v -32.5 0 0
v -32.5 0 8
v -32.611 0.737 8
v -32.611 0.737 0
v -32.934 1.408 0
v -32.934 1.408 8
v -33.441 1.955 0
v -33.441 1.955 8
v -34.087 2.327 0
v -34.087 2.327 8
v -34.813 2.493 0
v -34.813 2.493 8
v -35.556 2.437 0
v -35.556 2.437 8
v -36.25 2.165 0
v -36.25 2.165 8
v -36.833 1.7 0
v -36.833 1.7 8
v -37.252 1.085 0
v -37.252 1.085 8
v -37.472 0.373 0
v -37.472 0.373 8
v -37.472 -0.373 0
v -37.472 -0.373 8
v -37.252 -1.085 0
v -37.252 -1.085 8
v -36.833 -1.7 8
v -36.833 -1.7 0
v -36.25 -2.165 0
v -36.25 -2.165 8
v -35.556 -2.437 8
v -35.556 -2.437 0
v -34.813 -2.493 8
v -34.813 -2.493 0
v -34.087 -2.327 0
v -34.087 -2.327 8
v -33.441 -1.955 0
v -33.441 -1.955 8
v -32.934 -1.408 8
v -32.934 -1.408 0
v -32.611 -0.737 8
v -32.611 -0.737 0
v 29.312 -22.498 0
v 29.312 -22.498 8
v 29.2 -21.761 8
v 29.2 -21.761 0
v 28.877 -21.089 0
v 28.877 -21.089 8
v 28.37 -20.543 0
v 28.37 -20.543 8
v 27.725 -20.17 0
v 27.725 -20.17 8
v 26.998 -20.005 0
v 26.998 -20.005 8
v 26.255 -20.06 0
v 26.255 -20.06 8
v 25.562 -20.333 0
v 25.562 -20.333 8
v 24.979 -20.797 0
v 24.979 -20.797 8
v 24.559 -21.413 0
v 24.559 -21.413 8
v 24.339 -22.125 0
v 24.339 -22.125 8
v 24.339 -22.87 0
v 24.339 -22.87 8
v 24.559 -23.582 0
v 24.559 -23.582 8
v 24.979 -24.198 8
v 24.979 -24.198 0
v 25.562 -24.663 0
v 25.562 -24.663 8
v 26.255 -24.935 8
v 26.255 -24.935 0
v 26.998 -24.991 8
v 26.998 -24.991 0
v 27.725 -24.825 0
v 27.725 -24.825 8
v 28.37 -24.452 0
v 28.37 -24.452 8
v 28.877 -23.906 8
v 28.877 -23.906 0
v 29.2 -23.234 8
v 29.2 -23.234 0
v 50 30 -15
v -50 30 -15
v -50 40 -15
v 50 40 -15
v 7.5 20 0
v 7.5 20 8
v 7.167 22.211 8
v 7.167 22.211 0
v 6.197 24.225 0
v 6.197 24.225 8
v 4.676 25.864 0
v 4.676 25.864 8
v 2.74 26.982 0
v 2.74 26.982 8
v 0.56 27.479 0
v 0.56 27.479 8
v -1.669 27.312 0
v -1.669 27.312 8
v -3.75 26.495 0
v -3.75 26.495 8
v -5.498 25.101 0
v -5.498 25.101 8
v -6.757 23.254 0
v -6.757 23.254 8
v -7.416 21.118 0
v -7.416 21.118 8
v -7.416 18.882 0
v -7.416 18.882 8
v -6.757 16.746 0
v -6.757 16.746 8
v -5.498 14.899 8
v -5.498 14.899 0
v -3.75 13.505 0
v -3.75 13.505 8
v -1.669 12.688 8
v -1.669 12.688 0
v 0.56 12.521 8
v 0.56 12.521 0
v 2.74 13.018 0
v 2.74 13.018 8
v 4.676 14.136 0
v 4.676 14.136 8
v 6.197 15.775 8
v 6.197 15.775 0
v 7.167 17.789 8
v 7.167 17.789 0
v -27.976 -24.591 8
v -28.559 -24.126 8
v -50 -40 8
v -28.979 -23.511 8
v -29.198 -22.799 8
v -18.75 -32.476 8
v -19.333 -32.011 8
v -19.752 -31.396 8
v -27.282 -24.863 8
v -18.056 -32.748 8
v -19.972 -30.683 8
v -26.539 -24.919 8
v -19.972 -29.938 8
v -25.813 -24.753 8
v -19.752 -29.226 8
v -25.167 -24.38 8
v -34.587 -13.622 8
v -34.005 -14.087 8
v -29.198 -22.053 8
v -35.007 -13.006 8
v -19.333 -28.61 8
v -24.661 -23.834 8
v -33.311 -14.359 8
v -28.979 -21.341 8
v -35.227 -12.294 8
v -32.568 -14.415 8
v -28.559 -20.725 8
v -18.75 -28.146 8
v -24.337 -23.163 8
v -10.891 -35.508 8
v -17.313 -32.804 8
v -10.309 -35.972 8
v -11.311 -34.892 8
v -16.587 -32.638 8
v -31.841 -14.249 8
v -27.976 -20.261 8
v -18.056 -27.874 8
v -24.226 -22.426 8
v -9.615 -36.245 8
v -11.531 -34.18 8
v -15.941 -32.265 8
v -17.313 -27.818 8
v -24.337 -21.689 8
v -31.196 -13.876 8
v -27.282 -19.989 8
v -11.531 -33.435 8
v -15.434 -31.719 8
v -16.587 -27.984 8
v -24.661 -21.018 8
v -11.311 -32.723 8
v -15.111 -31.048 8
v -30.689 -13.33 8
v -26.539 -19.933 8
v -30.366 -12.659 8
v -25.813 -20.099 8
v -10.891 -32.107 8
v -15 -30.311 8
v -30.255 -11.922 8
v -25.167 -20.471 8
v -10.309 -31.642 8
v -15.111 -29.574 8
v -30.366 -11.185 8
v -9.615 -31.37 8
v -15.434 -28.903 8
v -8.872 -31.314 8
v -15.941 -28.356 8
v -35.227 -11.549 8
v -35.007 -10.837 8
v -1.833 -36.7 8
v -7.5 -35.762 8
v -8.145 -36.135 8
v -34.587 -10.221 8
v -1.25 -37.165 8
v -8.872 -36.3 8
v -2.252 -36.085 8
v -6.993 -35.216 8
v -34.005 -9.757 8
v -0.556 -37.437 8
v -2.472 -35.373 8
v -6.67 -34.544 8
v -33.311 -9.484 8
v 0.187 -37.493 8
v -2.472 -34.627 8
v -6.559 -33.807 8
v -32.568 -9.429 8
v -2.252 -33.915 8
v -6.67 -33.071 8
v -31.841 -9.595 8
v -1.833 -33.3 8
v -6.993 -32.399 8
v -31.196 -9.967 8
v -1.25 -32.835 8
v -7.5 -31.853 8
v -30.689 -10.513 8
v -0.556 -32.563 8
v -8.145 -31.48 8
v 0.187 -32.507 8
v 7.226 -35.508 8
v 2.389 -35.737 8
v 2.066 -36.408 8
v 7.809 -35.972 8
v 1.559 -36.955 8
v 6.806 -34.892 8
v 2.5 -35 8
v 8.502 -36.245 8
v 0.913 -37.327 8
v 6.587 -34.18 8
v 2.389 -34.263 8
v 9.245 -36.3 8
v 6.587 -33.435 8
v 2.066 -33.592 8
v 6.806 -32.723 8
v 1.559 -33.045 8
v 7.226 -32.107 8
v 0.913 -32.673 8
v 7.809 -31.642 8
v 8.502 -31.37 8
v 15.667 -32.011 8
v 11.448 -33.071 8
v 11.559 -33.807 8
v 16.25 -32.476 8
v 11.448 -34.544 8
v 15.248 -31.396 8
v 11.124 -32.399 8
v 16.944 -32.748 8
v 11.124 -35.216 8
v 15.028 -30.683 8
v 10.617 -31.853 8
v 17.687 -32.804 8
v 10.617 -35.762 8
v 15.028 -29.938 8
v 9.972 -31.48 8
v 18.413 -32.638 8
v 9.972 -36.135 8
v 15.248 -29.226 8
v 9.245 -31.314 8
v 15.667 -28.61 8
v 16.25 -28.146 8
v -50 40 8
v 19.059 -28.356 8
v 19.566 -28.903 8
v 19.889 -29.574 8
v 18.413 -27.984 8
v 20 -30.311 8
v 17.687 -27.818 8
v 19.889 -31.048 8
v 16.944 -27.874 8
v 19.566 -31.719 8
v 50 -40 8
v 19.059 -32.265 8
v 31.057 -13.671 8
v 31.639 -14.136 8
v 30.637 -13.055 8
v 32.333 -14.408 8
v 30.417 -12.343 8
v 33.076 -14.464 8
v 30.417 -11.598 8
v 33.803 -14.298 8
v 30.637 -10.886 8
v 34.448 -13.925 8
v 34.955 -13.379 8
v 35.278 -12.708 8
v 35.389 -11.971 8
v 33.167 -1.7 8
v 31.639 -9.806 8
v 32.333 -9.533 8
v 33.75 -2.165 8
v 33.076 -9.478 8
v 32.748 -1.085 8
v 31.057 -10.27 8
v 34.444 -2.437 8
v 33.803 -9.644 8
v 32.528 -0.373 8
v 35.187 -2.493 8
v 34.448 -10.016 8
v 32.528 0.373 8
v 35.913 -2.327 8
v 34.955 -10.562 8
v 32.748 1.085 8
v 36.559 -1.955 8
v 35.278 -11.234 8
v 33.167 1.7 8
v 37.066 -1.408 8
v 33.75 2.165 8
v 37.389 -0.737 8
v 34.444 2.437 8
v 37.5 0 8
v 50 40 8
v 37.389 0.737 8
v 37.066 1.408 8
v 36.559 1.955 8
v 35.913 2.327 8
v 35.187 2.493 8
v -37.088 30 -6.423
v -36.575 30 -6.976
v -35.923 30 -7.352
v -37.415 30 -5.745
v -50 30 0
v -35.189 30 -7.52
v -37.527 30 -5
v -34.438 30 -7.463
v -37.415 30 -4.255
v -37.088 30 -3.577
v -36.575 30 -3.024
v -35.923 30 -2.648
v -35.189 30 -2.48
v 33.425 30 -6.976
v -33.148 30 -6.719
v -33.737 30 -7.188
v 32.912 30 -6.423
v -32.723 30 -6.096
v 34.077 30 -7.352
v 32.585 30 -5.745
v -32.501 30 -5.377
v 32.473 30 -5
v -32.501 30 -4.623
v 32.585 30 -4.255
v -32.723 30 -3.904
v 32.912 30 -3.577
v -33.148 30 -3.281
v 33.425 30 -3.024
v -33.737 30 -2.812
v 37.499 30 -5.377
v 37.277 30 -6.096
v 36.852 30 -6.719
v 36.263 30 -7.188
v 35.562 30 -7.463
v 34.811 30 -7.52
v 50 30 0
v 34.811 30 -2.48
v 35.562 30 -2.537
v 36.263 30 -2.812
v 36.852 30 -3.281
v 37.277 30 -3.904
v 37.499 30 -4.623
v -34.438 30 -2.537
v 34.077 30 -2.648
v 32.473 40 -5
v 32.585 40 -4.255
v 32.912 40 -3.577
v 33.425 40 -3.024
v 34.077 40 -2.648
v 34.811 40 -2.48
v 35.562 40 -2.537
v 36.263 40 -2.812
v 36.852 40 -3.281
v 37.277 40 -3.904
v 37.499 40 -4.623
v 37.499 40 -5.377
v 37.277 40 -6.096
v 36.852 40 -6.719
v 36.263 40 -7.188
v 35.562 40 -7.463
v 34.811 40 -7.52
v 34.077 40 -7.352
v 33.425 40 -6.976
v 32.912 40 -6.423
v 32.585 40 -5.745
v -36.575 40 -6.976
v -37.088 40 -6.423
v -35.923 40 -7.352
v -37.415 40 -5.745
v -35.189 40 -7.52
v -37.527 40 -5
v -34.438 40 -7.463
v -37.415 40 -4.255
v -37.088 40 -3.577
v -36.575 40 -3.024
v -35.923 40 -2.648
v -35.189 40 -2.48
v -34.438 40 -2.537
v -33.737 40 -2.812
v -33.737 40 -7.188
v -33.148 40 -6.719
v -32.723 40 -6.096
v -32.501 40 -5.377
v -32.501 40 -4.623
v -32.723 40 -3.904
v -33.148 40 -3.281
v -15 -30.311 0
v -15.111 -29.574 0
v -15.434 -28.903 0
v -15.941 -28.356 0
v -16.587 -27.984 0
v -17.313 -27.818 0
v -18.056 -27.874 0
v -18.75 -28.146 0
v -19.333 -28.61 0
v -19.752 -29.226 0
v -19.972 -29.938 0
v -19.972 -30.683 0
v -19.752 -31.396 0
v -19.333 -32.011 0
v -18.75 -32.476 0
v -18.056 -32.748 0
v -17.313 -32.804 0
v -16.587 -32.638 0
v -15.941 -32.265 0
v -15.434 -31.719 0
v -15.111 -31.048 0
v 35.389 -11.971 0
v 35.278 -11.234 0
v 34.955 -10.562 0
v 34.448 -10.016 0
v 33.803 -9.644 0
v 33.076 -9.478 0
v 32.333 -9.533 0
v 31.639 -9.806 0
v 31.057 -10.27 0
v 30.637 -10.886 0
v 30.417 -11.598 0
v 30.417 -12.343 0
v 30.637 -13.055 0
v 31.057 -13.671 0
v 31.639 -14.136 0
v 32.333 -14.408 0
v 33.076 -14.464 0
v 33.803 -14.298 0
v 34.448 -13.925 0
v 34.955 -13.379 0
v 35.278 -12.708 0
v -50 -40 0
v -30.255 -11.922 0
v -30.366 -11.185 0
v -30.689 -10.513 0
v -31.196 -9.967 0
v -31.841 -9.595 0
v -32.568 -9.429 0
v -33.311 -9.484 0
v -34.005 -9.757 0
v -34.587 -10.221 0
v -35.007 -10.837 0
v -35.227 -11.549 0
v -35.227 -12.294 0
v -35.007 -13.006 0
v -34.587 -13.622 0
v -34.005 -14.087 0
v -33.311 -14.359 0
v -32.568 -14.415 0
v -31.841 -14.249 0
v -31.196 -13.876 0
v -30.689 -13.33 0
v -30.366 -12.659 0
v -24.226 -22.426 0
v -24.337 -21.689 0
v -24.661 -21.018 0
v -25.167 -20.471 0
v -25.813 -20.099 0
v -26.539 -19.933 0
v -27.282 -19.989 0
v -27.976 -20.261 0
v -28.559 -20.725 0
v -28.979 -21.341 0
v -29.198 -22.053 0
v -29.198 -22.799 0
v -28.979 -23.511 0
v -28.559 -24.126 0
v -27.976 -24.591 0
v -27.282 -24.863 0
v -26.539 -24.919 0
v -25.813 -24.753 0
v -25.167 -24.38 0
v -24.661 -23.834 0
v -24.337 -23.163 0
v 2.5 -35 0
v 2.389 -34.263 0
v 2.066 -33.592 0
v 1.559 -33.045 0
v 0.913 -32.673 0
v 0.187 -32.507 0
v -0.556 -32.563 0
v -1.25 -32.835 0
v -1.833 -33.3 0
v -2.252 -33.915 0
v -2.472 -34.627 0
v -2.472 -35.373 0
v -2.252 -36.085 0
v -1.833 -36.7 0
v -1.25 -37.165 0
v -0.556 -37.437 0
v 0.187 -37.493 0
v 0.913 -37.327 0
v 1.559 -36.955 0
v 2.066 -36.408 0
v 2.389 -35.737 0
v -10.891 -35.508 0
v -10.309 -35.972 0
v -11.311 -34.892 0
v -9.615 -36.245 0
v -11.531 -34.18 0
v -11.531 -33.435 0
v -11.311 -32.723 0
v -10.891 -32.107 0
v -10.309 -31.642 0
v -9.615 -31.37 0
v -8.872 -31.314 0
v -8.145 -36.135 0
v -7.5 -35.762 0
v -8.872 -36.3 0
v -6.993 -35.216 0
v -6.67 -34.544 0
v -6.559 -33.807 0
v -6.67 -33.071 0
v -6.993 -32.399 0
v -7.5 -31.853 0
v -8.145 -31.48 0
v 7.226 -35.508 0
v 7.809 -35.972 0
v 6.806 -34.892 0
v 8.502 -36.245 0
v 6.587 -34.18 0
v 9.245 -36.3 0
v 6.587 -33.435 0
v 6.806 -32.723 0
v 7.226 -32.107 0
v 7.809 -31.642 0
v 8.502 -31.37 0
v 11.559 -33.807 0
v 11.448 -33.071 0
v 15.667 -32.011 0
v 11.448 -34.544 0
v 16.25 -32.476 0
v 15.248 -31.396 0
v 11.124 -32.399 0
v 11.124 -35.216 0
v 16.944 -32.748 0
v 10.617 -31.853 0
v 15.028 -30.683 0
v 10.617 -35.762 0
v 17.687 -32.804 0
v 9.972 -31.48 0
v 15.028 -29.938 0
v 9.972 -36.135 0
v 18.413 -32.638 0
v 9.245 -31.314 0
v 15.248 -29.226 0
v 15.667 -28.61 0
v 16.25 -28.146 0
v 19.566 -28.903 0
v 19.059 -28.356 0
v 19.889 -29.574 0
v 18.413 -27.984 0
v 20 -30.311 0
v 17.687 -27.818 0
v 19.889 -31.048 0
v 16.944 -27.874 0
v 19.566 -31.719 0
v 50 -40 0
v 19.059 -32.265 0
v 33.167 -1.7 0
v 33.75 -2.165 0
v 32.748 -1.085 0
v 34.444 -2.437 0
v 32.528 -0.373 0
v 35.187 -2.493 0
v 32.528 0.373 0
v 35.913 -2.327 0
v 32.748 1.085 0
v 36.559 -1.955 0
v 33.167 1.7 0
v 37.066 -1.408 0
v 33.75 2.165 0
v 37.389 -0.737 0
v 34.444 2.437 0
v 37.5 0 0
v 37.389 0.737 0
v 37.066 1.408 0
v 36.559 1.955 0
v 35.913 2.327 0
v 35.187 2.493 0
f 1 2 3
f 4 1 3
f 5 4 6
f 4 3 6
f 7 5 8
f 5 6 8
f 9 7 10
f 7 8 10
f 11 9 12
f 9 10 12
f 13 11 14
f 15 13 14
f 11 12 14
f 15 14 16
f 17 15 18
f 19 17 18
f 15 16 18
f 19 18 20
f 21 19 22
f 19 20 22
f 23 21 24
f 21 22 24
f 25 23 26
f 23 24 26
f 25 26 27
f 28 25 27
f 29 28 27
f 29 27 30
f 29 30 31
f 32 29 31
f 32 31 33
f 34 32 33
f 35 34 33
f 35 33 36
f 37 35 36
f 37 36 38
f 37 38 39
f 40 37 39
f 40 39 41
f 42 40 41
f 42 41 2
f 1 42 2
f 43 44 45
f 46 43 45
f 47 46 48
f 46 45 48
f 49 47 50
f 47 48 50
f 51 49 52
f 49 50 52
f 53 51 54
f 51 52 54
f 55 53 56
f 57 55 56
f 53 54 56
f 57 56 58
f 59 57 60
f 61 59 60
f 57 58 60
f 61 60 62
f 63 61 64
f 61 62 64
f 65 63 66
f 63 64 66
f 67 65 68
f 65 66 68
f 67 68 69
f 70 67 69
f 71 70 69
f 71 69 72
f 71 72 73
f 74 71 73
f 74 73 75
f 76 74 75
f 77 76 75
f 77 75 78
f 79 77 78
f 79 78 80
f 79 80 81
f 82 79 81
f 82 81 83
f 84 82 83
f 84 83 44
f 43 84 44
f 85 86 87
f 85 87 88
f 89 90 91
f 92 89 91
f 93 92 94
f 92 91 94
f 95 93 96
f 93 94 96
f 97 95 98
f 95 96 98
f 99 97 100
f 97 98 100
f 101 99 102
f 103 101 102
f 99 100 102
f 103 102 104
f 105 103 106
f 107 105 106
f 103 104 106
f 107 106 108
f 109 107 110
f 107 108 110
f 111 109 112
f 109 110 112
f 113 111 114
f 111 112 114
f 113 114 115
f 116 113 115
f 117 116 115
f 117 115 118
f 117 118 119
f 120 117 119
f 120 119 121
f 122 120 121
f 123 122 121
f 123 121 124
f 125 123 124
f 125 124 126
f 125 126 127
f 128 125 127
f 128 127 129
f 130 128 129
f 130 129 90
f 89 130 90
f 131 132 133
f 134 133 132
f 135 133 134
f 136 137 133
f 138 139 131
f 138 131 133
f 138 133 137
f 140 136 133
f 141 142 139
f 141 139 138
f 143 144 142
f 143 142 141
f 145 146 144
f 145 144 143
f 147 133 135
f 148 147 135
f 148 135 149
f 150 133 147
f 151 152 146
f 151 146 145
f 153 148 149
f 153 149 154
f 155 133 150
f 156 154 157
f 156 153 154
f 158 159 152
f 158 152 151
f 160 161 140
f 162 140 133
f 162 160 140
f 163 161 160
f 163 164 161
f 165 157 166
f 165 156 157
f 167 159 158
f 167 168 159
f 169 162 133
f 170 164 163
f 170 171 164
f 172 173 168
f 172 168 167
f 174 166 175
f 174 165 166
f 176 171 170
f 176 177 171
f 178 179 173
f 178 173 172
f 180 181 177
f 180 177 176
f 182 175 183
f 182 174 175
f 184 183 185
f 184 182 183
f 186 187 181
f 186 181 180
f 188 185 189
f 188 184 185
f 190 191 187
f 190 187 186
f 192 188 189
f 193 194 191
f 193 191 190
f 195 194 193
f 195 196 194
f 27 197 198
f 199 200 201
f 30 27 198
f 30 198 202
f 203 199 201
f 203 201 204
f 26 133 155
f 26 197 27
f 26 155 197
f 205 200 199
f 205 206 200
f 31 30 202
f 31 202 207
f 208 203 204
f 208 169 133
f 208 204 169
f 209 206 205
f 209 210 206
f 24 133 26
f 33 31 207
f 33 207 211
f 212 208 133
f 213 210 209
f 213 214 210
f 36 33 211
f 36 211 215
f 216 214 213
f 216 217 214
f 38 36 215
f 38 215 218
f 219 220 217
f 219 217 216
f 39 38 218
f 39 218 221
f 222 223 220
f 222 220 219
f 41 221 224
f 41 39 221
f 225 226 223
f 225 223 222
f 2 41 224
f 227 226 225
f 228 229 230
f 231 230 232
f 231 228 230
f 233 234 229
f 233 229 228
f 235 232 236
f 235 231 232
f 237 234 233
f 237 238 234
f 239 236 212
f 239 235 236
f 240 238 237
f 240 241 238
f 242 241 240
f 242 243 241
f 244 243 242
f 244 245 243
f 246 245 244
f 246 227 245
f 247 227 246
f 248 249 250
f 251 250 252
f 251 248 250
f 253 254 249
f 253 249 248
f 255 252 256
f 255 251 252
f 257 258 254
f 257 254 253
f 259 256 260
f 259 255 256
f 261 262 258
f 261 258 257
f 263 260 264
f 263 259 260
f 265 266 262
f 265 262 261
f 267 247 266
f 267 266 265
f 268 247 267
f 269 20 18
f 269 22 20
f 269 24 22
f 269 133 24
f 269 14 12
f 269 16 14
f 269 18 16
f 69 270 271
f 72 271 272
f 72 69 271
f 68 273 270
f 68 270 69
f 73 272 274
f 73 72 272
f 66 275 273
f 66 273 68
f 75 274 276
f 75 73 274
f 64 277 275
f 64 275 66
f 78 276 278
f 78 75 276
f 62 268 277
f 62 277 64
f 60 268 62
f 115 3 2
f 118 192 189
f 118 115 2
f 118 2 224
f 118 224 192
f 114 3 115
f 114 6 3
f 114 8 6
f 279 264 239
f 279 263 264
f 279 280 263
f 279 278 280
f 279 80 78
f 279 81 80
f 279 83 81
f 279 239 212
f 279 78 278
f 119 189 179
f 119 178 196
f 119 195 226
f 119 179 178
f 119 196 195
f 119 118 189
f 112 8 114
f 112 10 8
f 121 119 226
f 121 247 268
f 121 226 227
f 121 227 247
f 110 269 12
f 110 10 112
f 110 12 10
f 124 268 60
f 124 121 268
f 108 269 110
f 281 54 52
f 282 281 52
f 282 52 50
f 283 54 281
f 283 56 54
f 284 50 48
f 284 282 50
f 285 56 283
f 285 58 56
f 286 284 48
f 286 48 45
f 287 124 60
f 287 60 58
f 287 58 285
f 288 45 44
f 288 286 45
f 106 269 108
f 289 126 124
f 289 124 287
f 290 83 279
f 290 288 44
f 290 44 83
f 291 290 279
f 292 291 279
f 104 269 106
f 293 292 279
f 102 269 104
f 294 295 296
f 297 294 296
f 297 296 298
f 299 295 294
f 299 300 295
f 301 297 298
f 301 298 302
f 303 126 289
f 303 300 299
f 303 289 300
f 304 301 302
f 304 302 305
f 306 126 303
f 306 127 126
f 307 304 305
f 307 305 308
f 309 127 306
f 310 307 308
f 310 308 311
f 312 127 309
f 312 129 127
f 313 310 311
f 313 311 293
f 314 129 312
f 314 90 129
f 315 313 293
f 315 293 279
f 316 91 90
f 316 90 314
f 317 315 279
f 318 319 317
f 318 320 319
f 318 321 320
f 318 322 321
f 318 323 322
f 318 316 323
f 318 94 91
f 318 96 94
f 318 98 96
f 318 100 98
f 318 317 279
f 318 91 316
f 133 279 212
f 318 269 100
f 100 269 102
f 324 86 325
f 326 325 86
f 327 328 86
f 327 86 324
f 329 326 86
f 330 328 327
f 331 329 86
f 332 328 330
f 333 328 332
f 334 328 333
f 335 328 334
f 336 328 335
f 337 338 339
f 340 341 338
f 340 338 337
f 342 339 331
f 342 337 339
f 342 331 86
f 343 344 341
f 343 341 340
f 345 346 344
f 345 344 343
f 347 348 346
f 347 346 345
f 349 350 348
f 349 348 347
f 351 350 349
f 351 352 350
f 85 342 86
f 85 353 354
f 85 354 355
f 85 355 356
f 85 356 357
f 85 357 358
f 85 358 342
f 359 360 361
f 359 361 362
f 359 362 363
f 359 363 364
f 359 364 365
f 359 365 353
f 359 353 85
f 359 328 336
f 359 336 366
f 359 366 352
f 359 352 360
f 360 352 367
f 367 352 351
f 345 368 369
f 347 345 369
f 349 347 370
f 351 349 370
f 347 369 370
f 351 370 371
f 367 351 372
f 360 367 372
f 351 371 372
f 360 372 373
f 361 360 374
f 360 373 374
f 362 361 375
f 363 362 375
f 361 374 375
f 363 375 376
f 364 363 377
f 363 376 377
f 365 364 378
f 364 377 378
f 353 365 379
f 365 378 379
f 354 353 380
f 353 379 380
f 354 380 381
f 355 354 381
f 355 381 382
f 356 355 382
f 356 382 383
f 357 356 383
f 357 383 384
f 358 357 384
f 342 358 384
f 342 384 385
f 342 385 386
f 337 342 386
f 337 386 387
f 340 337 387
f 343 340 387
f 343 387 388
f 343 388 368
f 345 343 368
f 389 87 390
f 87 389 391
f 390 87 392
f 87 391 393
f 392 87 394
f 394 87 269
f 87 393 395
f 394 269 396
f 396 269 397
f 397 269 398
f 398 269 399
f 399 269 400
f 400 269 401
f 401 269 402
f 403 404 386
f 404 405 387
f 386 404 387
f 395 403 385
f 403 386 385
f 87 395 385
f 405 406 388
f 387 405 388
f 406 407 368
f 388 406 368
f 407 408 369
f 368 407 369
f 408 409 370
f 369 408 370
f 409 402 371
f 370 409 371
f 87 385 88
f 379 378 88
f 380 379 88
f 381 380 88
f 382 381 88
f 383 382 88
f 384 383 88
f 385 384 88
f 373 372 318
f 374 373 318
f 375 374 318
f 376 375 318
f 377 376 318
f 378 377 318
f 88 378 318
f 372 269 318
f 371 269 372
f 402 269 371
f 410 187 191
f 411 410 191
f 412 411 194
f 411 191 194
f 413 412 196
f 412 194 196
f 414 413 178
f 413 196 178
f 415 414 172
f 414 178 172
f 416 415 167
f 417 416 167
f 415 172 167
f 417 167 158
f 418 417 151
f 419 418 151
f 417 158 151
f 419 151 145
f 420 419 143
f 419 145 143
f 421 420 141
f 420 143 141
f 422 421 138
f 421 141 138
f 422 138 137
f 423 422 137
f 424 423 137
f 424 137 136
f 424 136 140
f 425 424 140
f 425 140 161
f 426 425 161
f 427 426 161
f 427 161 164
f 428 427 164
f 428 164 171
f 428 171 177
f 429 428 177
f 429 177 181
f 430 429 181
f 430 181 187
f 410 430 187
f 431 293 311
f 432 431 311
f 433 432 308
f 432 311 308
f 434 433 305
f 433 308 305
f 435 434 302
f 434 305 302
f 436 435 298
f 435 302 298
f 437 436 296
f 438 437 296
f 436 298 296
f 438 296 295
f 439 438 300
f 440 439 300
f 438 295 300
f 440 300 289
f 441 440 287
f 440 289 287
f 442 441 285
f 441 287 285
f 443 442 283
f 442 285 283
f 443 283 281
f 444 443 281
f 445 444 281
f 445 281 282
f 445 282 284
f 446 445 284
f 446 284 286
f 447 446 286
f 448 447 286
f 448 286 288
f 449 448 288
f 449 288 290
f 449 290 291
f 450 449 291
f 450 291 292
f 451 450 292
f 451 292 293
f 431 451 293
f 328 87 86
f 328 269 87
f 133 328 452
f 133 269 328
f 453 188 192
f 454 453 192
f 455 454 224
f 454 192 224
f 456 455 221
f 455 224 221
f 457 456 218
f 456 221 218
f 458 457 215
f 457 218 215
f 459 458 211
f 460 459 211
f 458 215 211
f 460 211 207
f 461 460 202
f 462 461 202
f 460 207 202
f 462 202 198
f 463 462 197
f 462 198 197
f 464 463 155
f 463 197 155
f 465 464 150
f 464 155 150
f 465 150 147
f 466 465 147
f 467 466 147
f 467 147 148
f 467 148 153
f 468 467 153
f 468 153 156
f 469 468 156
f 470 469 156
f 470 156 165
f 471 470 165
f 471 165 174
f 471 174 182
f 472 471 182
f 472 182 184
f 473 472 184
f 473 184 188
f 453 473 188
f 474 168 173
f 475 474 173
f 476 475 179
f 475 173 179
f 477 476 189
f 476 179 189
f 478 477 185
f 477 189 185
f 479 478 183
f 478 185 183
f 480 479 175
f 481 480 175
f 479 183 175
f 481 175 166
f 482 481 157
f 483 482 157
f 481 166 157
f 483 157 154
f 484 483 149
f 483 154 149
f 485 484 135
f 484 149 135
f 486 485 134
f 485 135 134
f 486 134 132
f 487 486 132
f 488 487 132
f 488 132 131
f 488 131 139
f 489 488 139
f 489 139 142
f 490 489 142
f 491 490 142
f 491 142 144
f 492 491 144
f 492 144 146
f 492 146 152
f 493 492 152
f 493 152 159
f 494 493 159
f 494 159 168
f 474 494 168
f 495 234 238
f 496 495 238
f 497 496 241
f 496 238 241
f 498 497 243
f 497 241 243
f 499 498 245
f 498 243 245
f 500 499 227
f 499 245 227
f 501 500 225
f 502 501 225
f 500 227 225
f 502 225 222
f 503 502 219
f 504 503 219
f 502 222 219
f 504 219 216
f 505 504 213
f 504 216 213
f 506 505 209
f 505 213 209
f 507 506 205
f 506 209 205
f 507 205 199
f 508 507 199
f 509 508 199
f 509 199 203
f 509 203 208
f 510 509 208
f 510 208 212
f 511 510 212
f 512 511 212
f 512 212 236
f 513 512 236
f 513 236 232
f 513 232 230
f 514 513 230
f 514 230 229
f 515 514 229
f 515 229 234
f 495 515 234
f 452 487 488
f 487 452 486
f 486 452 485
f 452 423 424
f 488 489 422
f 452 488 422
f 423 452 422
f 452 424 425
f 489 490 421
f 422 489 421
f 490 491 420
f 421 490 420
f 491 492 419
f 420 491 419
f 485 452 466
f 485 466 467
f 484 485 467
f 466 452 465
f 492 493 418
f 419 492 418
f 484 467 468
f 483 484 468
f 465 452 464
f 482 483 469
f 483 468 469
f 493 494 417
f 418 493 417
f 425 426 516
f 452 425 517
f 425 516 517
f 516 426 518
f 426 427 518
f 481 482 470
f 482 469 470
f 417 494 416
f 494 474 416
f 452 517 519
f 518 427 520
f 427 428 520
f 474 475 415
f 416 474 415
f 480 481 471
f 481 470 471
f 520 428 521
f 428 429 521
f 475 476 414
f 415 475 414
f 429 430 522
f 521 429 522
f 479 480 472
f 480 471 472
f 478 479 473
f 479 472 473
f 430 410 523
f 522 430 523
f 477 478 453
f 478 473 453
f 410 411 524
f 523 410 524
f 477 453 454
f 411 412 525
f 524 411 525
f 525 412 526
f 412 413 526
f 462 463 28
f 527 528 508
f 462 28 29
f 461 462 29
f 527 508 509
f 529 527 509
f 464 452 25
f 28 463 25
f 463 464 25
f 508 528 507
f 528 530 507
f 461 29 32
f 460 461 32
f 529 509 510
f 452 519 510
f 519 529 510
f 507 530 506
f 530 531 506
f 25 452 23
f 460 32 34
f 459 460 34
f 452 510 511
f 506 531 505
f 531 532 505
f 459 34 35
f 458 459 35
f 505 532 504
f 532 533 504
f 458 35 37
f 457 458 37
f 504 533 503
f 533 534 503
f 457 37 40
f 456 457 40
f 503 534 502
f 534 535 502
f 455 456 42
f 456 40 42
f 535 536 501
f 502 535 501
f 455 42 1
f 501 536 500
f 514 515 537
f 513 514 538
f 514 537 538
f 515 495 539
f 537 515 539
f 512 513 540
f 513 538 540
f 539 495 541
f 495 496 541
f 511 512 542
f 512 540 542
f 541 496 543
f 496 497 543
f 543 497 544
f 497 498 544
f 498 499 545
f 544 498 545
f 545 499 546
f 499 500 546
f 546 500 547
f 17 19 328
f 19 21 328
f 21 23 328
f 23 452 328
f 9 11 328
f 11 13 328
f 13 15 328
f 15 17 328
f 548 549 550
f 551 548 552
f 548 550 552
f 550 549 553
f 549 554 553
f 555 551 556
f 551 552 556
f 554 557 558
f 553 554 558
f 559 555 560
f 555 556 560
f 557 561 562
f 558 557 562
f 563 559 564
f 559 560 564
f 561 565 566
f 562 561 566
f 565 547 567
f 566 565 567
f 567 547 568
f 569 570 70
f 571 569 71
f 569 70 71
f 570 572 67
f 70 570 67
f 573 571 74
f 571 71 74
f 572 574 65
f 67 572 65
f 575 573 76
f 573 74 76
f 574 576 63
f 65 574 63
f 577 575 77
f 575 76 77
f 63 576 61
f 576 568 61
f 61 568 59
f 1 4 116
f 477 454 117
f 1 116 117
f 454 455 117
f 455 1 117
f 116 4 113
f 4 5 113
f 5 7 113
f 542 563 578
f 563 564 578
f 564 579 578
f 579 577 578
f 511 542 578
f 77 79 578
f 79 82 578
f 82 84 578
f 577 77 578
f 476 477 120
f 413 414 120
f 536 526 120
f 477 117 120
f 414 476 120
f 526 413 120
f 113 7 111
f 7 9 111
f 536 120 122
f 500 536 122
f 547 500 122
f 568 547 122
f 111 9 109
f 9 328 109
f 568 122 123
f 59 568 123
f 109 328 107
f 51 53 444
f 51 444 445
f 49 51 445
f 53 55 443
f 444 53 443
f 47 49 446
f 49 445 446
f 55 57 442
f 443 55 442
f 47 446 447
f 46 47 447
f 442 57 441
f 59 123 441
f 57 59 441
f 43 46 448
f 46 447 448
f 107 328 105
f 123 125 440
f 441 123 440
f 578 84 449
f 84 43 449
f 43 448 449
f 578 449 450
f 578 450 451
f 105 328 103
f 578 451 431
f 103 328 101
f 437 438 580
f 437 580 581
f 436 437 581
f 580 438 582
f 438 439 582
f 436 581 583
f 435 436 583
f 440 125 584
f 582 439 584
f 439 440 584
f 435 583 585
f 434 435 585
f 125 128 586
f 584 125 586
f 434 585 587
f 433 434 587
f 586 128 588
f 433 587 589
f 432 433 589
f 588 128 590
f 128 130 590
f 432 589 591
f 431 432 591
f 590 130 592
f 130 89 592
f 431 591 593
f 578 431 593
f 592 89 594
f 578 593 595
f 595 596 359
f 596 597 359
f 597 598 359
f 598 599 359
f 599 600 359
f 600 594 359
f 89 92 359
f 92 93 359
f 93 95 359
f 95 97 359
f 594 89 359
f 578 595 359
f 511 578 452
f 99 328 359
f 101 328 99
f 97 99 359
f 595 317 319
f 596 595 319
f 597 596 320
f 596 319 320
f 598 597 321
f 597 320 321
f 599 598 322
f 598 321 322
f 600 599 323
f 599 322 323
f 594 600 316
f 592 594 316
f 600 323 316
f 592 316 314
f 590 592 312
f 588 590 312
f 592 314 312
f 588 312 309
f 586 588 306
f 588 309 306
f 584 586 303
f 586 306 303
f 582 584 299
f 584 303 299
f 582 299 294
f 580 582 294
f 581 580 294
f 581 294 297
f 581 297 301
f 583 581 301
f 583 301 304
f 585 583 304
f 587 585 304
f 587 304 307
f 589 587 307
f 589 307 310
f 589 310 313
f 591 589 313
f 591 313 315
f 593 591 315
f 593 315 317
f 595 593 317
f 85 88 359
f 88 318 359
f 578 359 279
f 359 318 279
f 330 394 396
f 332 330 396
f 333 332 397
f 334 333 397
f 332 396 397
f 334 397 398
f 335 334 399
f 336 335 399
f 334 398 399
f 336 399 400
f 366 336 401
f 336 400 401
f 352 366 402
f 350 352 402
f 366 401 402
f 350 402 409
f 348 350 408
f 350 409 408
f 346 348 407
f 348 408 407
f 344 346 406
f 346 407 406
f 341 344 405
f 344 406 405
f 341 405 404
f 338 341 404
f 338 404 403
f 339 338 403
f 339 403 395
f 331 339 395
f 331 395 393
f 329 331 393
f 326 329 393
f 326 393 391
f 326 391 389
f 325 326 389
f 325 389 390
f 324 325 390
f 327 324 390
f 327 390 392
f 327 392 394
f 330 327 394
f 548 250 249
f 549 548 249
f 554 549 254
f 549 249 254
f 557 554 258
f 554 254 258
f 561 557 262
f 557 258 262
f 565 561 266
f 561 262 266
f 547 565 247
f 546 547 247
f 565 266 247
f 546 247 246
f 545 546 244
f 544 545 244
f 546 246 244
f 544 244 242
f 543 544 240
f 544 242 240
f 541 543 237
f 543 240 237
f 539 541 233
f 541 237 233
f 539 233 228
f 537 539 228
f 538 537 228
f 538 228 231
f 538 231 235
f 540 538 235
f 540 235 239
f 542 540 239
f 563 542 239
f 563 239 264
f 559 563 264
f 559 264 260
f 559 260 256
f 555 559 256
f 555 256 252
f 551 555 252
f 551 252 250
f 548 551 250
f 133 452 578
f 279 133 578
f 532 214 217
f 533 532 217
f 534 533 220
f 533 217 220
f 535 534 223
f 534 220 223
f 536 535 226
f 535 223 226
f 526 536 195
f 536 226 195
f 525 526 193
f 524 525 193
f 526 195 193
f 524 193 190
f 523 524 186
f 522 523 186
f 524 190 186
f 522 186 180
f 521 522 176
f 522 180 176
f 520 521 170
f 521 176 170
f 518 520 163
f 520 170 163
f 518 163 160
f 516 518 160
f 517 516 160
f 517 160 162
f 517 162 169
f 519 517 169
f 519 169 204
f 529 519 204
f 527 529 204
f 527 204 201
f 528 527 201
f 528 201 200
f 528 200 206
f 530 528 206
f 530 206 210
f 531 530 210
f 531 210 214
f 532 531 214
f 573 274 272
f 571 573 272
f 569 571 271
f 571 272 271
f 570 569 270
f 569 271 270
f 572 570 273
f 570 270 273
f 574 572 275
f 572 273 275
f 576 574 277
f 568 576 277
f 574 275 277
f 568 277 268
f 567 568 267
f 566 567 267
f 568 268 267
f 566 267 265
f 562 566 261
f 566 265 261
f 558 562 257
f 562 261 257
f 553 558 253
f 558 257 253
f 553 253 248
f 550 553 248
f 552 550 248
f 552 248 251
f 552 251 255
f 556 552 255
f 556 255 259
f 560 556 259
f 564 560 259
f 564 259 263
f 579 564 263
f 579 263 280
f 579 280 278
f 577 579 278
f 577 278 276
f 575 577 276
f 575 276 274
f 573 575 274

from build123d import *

# Parameters (mm, degrees)
F0_W     = 100
F0_H     = 80
F1_DEPTH = 8
F2_R     = 2.5
F3_DEPTH = 25
F4_W     = 100
F4_H     = 10
F5_DEPTH = 15
F6_R     = 2.526813
F7_DEPTH = 25
F8_R     = 7.5
F9_DEPTH = 25


with BuildPart() as f1:
    # F0 (on Top) → F1 (new body)
    with BuildSketch(Plane.XY):
        Rectangle(F0_W, F0_H)
    extrude(amount=F1_DEPTH)

    # F2 (on face) → F3 (cut)
    with BuildSketch(Plane.XY.offset(8)):
        with Locations((-32.754592, -11.921697)):
            Circle(F2_R)
        with Locations((-26.726142, -22.425896)):
            Circle(F2_R)
        with Locations((-17.5, -30.310889)):
            Circle(F2_R)
        with Locations((0, -35)):
            Circle(F2_R)
        with Locations((-35, 0)):
            Circle(F2_R)
        with Locations((17.5, -30.310889)):
            Circle(F2_R)
        with Locations((26.811556, -22.497566)):
            Circle(F2_R)
        with Locations((32.889242, -11.970705)):
            Circle(F2_R)
        with Locations((35, 0)):
            Circle(F2_R)
        with Locations((-9.058667, -33.807404)):
            Circle(F2_R)
        with Locations((9.058667, -33.807404)):
            Circle(F2_R)
    extrude(amount=-F3_DEPTH, mode=Mode.SUBTRACT)

    # F4 (on face) → F5 (join)
    with BuildSketch(Plane(origin=(0, 0, 0), x_dir=(1, 0, 0), z_dir=(0, 0, -1))):
        with Locations((0, -35)):
            Rectangle(F4_W, F4_H)
    extrude(amount=F5_DEPTH)

    # F6 (on face) → F7 (cut)
    with BuildSketch(Plane(origin=(0, 40, 0), x_dir=(-1, 0, 0), z_dir=(0, 1, 0))):
        with Locations((35, -5)):
            Circle(F6_R)
        with Locations((-35, -5)):
            Circle(F6_R)
    extrude(amount=-F7_DEPTH, mode=Mode.SUBTRACT)

    # F8 (on face) → F9 (cut)
    with BuildSketch(Plane.XY.offset(8)):
        with Locations((0, 20)):
            Circle(F8_R)
    extrude(amount=-F9_DEPTH, mode=Mode.SUBTRACT)


solid = f1.part
